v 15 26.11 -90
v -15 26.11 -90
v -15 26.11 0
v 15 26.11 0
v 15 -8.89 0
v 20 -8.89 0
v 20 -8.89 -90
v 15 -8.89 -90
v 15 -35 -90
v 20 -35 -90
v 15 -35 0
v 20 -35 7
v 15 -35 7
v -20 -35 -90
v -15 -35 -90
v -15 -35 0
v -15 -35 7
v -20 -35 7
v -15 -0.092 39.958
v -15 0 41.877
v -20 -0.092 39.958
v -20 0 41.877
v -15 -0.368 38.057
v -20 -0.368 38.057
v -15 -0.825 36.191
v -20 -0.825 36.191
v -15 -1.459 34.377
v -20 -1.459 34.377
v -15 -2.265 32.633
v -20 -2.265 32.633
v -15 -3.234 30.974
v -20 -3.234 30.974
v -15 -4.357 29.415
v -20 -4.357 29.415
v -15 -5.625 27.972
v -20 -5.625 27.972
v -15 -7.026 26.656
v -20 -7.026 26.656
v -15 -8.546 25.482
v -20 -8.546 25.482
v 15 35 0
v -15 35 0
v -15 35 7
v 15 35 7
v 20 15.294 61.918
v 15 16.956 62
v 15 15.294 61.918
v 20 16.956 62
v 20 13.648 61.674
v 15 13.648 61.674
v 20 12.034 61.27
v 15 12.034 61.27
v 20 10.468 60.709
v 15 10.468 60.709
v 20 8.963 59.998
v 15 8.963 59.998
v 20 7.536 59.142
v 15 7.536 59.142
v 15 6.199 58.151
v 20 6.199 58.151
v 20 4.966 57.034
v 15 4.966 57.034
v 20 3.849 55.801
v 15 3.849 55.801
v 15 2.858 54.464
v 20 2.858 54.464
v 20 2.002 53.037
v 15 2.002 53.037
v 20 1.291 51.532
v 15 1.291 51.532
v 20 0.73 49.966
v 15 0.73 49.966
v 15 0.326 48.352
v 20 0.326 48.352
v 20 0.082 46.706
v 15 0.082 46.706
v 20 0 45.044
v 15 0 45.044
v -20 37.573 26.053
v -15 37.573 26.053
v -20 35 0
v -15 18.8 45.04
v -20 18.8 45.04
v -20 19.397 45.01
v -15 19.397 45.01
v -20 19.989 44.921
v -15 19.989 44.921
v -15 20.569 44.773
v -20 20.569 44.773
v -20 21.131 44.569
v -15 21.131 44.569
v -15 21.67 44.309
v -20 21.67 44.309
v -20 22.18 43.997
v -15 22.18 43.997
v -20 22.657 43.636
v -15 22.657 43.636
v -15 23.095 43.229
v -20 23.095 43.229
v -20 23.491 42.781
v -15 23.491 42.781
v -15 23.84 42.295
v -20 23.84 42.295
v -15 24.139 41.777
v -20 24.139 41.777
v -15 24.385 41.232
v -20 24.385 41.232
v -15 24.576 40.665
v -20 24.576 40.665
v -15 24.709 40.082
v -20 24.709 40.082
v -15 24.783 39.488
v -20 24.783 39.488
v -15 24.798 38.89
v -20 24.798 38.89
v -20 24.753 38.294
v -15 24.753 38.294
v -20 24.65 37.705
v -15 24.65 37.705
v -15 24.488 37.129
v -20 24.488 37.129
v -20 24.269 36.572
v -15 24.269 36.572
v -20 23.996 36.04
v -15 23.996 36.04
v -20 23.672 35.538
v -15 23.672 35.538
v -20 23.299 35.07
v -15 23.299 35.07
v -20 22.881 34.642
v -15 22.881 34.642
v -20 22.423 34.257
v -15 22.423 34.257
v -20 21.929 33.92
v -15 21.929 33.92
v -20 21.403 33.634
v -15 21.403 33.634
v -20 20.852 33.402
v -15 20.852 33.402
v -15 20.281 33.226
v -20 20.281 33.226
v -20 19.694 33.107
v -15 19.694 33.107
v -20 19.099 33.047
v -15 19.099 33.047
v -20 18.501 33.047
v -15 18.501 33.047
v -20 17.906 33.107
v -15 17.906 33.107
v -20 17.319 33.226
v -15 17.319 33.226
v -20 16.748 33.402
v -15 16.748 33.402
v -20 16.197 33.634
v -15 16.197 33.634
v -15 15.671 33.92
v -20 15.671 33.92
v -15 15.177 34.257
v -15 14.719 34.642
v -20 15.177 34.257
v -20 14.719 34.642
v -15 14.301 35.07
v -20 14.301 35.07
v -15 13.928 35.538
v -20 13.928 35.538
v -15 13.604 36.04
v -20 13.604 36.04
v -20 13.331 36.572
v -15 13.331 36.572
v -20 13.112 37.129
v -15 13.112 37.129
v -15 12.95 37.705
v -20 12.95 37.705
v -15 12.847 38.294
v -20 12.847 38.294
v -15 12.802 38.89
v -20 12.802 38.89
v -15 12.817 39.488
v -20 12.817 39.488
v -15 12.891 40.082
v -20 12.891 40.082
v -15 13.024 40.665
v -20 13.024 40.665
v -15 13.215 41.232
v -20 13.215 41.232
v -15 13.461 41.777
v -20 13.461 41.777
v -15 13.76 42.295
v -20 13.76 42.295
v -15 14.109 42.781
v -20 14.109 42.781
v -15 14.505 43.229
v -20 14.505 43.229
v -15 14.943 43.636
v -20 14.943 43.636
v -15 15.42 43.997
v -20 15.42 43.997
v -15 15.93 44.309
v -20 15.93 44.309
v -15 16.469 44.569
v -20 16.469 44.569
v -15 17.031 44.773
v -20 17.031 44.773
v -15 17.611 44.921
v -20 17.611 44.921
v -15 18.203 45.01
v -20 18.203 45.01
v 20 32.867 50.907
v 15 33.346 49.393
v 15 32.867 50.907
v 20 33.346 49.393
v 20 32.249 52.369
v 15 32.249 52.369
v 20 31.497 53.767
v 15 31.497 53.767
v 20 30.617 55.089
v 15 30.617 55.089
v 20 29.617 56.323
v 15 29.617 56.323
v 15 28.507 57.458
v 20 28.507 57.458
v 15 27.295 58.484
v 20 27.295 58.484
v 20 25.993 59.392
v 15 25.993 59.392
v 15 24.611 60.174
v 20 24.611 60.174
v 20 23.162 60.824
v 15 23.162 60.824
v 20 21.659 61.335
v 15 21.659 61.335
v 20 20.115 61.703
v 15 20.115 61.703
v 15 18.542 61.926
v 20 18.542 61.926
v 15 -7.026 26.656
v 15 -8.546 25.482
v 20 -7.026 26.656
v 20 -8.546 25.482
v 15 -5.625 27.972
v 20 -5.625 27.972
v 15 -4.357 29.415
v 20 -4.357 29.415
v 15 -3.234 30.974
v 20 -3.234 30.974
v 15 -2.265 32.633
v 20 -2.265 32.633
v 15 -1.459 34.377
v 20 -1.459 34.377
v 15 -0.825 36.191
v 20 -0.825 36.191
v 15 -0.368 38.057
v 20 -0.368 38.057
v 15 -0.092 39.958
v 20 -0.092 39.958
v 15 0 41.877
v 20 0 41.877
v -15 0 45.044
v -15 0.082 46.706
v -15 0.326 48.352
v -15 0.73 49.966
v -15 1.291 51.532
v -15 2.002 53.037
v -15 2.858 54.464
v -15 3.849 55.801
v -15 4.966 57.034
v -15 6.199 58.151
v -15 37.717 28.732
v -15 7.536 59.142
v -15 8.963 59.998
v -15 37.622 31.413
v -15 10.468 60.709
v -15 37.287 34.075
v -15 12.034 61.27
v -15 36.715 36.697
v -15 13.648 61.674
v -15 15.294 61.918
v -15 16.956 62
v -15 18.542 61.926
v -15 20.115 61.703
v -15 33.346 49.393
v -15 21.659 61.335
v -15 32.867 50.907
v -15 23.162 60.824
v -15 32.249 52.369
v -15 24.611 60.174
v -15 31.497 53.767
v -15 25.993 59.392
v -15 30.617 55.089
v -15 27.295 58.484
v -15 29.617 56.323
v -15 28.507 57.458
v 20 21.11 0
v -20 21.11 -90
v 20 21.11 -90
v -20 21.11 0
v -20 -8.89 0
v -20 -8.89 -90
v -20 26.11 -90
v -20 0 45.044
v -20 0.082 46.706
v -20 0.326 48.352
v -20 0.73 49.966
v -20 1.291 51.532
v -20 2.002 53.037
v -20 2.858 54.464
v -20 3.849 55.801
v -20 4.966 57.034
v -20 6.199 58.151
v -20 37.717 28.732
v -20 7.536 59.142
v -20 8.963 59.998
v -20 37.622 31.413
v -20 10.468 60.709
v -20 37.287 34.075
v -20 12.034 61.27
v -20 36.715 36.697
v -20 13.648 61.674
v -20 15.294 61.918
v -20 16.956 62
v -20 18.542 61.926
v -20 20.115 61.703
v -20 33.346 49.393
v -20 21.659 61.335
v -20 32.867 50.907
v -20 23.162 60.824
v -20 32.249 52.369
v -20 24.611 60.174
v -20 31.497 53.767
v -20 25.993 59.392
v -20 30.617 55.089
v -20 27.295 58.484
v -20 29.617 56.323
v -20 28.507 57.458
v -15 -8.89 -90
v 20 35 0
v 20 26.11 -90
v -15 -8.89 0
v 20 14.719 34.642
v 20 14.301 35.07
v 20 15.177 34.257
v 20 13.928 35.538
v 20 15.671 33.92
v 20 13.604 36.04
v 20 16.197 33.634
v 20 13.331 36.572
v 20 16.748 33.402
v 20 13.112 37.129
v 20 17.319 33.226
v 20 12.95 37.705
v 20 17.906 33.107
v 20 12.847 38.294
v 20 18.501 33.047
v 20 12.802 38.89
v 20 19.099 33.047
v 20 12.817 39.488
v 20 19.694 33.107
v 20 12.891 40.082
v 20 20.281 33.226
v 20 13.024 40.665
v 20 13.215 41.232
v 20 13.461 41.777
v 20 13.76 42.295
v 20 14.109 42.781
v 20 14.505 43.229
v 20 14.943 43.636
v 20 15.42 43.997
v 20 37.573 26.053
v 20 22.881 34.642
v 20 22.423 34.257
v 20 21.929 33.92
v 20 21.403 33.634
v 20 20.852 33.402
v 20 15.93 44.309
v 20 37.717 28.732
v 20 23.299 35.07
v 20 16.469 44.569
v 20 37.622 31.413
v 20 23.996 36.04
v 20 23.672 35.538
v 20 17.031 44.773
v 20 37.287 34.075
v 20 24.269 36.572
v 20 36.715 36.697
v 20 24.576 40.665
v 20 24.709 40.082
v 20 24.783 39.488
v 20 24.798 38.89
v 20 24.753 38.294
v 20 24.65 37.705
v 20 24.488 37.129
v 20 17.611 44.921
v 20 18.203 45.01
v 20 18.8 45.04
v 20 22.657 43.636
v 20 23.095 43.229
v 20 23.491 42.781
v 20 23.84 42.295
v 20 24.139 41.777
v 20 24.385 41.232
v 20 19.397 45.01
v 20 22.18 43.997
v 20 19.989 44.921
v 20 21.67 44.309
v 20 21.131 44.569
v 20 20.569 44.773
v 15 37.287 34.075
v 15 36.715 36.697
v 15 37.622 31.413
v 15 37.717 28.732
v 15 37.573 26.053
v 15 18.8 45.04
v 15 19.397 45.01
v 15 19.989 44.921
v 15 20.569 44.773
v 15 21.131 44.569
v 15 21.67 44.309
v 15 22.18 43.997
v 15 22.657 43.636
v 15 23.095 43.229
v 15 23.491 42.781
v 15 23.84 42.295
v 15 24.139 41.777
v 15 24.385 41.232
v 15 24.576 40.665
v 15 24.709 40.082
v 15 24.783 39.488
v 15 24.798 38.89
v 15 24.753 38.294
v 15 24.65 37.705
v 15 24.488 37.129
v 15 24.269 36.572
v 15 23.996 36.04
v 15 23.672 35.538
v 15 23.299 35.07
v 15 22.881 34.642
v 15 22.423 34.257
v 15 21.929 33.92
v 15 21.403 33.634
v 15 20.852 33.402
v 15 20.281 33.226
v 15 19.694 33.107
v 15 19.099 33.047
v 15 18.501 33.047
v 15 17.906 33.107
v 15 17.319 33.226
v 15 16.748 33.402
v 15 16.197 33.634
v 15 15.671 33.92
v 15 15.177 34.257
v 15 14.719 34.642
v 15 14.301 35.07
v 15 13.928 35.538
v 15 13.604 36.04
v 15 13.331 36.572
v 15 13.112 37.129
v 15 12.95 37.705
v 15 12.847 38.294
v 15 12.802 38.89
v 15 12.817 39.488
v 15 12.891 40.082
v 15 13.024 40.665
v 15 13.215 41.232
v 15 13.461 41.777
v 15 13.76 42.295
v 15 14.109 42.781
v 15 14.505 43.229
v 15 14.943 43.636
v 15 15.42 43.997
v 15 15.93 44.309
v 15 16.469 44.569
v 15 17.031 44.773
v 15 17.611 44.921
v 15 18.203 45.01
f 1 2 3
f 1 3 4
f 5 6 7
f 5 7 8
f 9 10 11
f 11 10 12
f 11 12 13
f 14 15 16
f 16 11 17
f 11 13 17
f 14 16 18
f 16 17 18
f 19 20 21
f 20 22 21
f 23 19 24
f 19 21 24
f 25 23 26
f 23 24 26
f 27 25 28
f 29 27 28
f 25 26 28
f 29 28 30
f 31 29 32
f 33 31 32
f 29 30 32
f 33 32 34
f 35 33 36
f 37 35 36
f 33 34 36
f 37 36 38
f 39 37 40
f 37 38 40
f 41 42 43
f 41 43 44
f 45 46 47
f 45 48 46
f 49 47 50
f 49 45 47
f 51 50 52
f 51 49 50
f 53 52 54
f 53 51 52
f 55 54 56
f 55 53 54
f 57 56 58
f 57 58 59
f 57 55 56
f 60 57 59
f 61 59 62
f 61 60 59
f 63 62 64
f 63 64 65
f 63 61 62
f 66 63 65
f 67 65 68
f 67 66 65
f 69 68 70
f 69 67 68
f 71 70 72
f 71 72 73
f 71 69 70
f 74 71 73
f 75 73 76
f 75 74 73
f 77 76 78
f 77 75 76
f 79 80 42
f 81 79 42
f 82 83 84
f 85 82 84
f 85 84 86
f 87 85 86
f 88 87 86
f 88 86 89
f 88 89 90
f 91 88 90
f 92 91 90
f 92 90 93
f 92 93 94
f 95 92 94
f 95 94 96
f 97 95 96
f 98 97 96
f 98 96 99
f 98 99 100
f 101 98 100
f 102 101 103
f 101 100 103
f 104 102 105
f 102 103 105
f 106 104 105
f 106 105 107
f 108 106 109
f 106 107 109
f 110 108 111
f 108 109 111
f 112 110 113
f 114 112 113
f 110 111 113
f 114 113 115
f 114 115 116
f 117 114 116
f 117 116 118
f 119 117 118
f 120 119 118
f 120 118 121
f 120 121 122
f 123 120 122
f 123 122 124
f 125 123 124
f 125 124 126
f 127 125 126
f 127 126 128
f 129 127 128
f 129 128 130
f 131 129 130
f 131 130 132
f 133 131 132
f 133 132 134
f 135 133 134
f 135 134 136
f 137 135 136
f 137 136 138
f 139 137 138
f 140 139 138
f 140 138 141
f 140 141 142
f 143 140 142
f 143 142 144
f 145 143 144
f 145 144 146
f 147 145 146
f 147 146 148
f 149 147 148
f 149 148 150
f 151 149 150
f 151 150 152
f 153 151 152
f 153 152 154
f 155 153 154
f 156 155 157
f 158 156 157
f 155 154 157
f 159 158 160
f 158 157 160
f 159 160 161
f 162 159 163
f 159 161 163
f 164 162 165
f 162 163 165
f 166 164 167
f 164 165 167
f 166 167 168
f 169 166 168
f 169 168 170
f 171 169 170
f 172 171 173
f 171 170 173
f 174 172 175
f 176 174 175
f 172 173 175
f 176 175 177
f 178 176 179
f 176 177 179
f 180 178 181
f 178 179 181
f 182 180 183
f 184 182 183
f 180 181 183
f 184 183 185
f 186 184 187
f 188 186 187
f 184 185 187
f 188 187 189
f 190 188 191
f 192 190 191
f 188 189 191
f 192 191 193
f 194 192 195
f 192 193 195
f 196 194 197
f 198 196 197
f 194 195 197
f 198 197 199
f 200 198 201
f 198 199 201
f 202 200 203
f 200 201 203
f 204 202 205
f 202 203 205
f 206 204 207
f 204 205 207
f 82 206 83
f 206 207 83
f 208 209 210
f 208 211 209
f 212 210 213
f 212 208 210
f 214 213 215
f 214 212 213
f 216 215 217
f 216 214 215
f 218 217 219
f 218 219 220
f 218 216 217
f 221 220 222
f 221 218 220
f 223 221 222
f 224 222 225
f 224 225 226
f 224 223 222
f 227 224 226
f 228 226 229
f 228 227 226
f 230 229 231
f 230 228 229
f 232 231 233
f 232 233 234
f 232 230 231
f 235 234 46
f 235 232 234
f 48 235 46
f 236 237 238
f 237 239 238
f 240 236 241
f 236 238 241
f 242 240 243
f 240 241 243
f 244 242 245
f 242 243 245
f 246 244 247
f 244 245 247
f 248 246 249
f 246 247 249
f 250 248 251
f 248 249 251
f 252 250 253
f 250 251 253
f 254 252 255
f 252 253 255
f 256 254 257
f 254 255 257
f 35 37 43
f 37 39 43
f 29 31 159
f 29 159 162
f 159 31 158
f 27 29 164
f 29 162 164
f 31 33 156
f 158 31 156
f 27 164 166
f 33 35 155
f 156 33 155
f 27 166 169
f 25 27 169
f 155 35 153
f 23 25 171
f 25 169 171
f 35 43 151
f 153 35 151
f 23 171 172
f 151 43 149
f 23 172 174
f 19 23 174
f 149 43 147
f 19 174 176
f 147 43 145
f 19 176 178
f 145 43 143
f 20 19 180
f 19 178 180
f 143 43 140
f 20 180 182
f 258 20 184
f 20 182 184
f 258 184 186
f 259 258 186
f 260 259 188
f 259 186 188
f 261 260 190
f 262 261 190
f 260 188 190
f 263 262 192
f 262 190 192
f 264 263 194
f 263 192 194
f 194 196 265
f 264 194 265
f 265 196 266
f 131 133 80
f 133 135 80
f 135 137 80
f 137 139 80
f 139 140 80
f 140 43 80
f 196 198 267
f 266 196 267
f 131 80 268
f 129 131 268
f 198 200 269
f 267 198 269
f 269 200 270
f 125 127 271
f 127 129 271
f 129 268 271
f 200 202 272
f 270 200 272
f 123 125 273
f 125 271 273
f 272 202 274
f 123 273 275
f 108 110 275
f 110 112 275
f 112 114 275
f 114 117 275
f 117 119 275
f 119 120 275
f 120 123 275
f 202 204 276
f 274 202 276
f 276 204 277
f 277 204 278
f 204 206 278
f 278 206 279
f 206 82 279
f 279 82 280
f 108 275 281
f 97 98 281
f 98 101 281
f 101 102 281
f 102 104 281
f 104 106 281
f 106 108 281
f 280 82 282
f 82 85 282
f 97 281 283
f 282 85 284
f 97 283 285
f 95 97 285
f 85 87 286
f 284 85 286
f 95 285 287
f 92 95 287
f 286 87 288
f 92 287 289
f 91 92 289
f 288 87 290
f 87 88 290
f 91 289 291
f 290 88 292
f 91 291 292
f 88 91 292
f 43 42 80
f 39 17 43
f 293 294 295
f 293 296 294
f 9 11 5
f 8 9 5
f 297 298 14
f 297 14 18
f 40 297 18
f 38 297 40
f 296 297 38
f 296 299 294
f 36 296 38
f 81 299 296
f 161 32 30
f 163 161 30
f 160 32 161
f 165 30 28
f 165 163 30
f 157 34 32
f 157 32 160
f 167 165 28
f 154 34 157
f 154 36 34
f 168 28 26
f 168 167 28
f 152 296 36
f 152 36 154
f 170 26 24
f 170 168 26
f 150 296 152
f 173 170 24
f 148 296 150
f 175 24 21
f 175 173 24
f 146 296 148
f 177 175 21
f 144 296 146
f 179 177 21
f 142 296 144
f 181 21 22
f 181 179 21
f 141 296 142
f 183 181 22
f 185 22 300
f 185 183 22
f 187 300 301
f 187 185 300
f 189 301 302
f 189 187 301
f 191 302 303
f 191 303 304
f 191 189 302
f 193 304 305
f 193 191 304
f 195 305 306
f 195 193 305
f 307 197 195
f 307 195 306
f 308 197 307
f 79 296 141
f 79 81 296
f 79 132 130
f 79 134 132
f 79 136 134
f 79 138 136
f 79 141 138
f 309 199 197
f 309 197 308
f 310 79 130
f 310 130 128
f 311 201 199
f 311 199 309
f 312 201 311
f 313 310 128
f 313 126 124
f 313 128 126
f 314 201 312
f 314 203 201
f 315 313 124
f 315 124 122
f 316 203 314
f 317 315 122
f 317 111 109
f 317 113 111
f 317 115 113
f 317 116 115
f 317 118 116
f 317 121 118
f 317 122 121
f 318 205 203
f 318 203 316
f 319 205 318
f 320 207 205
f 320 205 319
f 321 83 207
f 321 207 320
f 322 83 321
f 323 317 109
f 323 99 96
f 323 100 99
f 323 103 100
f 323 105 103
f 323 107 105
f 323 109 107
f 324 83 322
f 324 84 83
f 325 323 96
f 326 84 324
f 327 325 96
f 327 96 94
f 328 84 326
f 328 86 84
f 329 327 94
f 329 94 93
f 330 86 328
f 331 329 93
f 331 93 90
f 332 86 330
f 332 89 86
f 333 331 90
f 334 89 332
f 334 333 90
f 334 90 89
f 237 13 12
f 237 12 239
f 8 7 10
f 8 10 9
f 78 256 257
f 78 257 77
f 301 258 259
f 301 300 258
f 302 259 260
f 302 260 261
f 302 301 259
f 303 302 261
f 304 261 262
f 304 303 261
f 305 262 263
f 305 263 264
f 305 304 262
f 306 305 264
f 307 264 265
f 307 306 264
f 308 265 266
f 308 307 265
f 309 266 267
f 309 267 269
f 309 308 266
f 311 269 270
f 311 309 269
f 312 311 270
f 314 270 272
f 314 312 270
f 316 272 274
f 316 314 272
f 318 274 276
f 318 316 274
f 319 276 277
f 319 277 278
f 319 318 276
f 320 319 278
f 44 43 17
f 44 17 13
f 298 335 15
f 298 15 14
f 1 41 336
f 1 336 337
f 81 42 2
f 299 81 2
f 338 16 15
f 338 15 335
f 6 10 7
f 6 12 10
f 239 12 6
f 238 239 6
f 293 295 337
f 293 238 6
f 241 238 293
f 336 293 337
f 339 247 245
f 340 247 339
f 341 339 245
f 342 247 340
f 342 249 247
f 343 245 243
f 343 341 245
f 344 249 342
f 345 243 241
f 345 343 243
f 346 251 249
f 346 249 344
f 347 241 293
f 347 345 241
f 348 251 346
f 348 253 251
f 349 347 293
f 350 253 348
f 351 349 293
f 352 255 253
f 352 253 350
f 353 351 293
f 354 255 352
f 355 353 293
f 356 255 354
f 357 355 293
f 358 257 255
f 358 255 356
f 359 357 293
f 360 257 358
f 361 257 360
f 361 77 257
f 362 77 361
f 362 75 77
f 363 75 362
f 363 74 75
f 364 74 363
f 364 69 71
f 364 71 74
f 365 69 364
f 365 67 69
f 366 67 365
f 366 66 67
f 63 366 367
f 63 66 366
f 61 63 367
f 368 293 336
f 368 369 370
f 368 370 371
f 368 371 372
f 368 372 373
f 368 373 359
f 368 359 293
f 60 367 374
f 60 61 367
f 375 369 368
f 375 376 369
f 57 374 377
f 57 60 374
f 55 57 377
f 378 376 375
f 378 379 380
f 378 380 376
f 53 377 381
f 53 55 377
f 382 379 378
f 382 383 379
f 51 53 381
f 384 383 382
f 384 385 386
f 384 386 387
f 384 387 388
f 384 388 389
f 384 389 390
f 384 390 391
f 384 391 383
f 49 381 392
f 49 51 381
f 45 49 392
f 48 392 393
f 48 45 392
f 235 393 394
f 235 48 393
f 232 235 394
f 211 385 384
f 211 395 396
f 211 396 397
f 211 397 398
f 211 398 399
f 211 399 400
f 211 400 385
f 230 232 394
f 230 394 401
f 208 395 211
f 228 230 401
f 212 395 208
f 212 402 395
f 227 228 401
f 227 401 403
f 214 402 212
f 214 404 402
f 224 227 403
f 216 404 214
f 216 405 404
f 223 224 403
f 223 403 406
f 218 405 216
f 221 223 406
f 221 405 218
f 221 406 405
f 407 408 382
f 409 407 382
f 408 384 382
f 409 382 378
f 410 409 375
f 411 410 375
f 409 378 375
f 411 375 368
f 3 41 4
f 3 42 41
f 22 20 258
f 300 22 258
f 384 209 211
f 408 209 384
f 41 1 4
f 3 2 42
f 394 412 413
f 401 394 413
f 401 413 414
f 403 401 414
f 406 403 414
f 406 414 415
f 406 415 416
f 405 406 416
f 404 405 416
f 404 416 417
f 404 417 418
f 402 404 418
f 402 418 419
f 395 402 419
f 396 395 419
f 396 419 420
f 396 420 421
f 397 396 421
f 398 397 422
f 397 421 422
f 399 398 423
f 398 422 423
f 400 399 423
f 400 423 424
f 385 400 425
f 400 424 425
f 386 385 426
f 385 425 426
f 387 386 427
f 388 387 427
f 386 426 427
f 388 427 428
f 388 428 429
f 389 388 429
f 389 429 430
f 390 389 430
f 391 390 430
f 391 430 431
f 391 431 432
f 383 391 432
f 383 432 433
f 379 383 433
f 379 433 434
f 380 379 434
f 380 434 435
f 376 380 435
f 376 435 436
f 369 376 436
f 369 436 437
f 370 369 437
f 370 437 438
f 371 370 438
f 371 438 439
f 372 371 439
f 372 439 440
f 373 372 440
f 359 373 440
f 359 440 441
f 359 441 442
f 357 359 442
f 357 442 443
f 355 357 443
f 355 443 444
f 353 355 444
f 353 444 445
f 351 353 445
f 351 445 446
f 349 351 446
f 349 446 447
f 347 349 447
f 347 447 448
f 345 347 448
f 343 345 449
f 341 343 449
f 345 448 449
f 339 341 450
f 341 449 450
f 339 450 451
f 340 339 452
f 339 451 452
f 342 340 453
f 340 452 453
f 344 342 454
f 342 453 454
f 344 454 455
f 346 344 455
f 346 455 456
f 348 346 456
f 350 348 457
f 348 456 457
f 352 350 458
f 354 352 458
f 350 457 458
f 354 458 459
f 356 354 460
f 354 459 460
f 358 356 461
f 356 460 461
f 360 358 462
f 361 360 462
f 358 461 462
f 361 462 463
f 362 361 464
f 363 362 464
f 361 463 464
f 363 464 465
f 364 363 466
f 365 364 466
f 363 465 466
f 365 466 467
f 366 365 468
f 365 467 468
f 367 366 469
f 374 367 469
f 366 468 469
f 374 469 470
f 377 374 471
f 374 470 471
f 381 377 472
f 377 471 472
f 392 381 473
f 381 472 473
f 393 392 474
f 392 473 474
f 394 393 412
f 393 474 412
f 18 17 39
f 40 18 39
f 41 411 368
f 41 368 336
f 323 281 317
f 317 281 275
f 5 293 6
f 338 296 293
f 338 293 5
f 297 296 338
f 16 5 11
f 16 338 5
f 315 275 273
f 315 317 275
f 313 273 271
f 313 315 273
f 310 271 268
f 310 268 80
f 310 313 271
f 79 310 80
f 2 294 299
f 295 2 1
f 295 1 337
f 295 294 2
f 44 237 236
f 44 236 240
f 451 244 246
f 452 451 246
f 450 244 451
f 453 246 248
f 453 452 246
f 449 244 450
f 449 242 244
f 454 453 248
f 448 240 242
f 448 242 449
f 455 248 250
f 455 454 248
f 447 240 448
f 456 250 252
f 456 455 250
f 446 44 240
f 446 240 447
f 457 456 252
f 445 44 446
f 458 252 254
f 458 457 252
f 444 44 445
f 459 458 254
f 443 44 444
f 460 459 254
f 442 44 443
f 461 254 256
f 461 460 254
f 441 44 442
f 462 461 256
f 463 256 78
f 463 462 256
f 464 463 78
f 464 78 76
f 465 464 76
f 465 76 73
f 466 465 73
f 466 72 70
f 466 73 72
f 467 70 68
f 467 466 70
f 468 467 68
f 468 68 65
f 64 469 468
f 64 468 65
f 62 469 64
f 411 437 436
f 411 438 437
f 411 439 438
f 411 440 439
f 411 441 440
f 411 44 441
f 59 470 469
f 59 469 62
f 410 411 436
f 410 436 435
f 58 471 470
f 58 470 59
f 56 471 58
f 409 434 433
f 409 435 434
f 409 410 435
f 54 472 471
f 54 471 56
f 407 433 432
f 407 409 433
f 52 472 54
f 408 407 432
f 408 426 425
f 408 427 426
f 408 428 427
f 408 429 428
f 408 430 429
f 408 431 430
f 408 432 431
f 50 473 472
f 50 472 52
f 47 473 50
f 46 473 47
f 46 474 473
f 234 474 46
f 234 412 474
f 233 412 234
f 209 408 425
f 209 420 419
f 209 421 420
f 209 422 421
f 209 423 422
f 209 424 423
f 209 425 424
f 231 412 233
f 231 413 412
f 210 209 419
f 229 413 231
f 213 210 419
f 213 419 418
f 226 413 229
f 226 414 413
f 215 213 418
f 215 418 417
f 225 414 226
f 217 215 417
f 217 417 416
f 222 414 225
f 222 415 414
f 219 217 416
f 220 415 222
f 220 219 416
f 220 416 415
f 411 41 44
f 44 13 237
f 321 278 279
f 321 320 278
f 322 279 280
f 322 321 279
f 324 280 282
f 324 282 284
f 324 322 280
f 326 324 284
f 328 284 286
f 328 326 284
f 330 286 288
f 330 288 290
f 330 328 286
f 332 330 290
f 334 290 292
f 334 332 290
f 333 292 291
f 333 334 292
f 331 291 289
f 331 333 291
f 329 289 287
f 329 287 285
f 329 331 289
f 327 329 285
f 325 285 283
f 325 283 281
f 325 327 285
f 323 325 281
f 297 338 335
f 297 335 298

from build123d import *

# Parameters (mm, degrees)
SZKIC1_W                    = 30
SZKIC1_H                    = 70
DODANIE_WYCI_GNI_CIE1_DEPTH = 7
DODANIE_WYCI_GNI_CIE2_DEPTH = 5
ZAOKR_GLENIE1_R             = 16.956486
ZAOKR_GLENIE2_R             = 16.956486
ZAOKR_GLENIE3_R             = 30
ZAOKR_GLENIE4_R             = 30
ZAOKR_GLENIE5_R             = 20
ZAOKR_GLENIE6_R             = 20
SZKIC6_R                    = 6
WYTNIJ_WYCI_GNI_CIE2_DEPTH  = 106.464214961
SZKIC9_W                    = 5
SZKIC9_H                    = 26.11
DODANIE_WYCI_GNI_CIE3_DEPTH = 90
SZKIC13_W                   = 30
SZKIC13_H                   = 90
DODANIE_WYCI_GNI_CIE6_DEPTH = 5


with BuildPart() as part:
    # Szkic1 → Dodanie-wyciągnięcie1 (new body)
    with BuildSketch(Plane.XY):
        Rectangle(SZKIC1_W, SZKIC1_H)
    extrude(amount=DODANIE_WYCI_GNI_CIE1_DEPTH)

    # Szkic5 → Dodanie-wyciągnięcie2 (add)
    with BuildSketch(Plane.ZY.offset(15)):
        Polygon((7, -35), (31.452159225, 0), (62, 0), (62, 30), (31.452159225, 38.106774395), (0, 35), (-90, 26.11), (-90, 21.11), (0, 21.11), (0, -35), align=None)
    dodanie_wyci_gni_cie2 = extrude(amount=DODANIE_WYCI_GNI_CIE2_DEPTH)

    # Lustro1: Dodanie-wyciągnięcie2 across plane
    add(dodanie_wyci_gni_cie2.mirror(Plane(origin=(0, 0, 0), x_dir=(0, 0, 1), z_dir=(1, 0, 0))))

    # Zaokrąglenie1
    zaokr_glenie1_edges = [part.edges().sort_by_distance(p)[0] for p in [
        (-17.5, 0, 62),
        (-17.5, 30, 62),
    ]]
    fillet(zaokr_glenie1_edges, radius=ZAOKR_GLENIE1_R)

    # Zaokrąglenie2
    zaokr_glenie2_edges = [part.edges().sort_by_distance(p)[0] for p in [
        (17.5, 30, 62),
        (17.5, 0, 62),
    ]]
    fillet(zaokr_glenie2_edges, radius=ZAOKR_GLENIE2_R)

    # Zaokrąglenie3
    zaokr_glenie3_edges = [part.edges().sort_by_distance(p)[0] for p in [
        (-17.5, 38.106774395, 31.452159225),
    ]]
    fillet(zaokr_glenie3_edges, radius=ZAOKR_GLENIE3_R)

    # Zaokrąglenie4
    zaokr_glenie4_edges = [part.edges().sort_by_distance(p)[0] for p in [
        (17.5, 38.106774395, 31.452159225),
    ]]
    fillet(zaokr_glenie4_edges, radius=ZAOKR_GLENIE4_R)

    # Zaokrąglenie5
    zaokr_glenie5_edges = [part.edges().sort_by_distance(p)[0] for p in [
        (-17.5, 0, 31.452159225),
    ]]
    fillet(zaokr_glenie5_edges, radius=ZAOKR_GLENIE5_R)

    # Zaokrąglenie6
    zaokr_glenie6_edges = [part.edges().sort_by_distance(p)[0] for p in [
        (17.5, 0, 31.452159225),
    ]]
    fillet(zaokr_glenie6_edges, radius=ZAOKR_GLENIE6_R)

    # Szkic6 → Wytnij-wyciągnięcie2 (cut, through all)
    with BuildSketch(Plane.ZY.offset(20)):
        with Locations((39.04, 18.8)):
            Circle(SZKIC6_R)
    extrude(amount=-WYTNIJ_WYCI_GNI_CIE2_DEPTH, mode=Mode.SUBTRACT)

    # Szkic9 → Dodanie-wyciągnięcie3 (add)
    with BuildSketch(Plane(origin=(0, 0, 0), x_dir=(-1, 0, 0), z_dir=(0, 0, -1))):
        with Locations((-17.5, -21.945)):
            Rectangle(SZKIC9_W, SZKIC9_H)
        with Locations((17.5, -21.945)):
            Rectangle(SZKIC9_W, SZKIC9_H)
    extrude(amount=DODANIE_WYCI_GNI_CIE3_DEPTH)

    # Szkic13 → Dodanie-wyciągnięcie6 (add)
    with BuildSketch(Plane.XZ.offset(-21.11)):
        with Locations((0, -45)):
            Rectangle(SZKIC13_W, SZKIC13_H)
    extrude(amount=-DODANIE_WYCI_GNI_CIE6_DEPTH)


solid = part.part
